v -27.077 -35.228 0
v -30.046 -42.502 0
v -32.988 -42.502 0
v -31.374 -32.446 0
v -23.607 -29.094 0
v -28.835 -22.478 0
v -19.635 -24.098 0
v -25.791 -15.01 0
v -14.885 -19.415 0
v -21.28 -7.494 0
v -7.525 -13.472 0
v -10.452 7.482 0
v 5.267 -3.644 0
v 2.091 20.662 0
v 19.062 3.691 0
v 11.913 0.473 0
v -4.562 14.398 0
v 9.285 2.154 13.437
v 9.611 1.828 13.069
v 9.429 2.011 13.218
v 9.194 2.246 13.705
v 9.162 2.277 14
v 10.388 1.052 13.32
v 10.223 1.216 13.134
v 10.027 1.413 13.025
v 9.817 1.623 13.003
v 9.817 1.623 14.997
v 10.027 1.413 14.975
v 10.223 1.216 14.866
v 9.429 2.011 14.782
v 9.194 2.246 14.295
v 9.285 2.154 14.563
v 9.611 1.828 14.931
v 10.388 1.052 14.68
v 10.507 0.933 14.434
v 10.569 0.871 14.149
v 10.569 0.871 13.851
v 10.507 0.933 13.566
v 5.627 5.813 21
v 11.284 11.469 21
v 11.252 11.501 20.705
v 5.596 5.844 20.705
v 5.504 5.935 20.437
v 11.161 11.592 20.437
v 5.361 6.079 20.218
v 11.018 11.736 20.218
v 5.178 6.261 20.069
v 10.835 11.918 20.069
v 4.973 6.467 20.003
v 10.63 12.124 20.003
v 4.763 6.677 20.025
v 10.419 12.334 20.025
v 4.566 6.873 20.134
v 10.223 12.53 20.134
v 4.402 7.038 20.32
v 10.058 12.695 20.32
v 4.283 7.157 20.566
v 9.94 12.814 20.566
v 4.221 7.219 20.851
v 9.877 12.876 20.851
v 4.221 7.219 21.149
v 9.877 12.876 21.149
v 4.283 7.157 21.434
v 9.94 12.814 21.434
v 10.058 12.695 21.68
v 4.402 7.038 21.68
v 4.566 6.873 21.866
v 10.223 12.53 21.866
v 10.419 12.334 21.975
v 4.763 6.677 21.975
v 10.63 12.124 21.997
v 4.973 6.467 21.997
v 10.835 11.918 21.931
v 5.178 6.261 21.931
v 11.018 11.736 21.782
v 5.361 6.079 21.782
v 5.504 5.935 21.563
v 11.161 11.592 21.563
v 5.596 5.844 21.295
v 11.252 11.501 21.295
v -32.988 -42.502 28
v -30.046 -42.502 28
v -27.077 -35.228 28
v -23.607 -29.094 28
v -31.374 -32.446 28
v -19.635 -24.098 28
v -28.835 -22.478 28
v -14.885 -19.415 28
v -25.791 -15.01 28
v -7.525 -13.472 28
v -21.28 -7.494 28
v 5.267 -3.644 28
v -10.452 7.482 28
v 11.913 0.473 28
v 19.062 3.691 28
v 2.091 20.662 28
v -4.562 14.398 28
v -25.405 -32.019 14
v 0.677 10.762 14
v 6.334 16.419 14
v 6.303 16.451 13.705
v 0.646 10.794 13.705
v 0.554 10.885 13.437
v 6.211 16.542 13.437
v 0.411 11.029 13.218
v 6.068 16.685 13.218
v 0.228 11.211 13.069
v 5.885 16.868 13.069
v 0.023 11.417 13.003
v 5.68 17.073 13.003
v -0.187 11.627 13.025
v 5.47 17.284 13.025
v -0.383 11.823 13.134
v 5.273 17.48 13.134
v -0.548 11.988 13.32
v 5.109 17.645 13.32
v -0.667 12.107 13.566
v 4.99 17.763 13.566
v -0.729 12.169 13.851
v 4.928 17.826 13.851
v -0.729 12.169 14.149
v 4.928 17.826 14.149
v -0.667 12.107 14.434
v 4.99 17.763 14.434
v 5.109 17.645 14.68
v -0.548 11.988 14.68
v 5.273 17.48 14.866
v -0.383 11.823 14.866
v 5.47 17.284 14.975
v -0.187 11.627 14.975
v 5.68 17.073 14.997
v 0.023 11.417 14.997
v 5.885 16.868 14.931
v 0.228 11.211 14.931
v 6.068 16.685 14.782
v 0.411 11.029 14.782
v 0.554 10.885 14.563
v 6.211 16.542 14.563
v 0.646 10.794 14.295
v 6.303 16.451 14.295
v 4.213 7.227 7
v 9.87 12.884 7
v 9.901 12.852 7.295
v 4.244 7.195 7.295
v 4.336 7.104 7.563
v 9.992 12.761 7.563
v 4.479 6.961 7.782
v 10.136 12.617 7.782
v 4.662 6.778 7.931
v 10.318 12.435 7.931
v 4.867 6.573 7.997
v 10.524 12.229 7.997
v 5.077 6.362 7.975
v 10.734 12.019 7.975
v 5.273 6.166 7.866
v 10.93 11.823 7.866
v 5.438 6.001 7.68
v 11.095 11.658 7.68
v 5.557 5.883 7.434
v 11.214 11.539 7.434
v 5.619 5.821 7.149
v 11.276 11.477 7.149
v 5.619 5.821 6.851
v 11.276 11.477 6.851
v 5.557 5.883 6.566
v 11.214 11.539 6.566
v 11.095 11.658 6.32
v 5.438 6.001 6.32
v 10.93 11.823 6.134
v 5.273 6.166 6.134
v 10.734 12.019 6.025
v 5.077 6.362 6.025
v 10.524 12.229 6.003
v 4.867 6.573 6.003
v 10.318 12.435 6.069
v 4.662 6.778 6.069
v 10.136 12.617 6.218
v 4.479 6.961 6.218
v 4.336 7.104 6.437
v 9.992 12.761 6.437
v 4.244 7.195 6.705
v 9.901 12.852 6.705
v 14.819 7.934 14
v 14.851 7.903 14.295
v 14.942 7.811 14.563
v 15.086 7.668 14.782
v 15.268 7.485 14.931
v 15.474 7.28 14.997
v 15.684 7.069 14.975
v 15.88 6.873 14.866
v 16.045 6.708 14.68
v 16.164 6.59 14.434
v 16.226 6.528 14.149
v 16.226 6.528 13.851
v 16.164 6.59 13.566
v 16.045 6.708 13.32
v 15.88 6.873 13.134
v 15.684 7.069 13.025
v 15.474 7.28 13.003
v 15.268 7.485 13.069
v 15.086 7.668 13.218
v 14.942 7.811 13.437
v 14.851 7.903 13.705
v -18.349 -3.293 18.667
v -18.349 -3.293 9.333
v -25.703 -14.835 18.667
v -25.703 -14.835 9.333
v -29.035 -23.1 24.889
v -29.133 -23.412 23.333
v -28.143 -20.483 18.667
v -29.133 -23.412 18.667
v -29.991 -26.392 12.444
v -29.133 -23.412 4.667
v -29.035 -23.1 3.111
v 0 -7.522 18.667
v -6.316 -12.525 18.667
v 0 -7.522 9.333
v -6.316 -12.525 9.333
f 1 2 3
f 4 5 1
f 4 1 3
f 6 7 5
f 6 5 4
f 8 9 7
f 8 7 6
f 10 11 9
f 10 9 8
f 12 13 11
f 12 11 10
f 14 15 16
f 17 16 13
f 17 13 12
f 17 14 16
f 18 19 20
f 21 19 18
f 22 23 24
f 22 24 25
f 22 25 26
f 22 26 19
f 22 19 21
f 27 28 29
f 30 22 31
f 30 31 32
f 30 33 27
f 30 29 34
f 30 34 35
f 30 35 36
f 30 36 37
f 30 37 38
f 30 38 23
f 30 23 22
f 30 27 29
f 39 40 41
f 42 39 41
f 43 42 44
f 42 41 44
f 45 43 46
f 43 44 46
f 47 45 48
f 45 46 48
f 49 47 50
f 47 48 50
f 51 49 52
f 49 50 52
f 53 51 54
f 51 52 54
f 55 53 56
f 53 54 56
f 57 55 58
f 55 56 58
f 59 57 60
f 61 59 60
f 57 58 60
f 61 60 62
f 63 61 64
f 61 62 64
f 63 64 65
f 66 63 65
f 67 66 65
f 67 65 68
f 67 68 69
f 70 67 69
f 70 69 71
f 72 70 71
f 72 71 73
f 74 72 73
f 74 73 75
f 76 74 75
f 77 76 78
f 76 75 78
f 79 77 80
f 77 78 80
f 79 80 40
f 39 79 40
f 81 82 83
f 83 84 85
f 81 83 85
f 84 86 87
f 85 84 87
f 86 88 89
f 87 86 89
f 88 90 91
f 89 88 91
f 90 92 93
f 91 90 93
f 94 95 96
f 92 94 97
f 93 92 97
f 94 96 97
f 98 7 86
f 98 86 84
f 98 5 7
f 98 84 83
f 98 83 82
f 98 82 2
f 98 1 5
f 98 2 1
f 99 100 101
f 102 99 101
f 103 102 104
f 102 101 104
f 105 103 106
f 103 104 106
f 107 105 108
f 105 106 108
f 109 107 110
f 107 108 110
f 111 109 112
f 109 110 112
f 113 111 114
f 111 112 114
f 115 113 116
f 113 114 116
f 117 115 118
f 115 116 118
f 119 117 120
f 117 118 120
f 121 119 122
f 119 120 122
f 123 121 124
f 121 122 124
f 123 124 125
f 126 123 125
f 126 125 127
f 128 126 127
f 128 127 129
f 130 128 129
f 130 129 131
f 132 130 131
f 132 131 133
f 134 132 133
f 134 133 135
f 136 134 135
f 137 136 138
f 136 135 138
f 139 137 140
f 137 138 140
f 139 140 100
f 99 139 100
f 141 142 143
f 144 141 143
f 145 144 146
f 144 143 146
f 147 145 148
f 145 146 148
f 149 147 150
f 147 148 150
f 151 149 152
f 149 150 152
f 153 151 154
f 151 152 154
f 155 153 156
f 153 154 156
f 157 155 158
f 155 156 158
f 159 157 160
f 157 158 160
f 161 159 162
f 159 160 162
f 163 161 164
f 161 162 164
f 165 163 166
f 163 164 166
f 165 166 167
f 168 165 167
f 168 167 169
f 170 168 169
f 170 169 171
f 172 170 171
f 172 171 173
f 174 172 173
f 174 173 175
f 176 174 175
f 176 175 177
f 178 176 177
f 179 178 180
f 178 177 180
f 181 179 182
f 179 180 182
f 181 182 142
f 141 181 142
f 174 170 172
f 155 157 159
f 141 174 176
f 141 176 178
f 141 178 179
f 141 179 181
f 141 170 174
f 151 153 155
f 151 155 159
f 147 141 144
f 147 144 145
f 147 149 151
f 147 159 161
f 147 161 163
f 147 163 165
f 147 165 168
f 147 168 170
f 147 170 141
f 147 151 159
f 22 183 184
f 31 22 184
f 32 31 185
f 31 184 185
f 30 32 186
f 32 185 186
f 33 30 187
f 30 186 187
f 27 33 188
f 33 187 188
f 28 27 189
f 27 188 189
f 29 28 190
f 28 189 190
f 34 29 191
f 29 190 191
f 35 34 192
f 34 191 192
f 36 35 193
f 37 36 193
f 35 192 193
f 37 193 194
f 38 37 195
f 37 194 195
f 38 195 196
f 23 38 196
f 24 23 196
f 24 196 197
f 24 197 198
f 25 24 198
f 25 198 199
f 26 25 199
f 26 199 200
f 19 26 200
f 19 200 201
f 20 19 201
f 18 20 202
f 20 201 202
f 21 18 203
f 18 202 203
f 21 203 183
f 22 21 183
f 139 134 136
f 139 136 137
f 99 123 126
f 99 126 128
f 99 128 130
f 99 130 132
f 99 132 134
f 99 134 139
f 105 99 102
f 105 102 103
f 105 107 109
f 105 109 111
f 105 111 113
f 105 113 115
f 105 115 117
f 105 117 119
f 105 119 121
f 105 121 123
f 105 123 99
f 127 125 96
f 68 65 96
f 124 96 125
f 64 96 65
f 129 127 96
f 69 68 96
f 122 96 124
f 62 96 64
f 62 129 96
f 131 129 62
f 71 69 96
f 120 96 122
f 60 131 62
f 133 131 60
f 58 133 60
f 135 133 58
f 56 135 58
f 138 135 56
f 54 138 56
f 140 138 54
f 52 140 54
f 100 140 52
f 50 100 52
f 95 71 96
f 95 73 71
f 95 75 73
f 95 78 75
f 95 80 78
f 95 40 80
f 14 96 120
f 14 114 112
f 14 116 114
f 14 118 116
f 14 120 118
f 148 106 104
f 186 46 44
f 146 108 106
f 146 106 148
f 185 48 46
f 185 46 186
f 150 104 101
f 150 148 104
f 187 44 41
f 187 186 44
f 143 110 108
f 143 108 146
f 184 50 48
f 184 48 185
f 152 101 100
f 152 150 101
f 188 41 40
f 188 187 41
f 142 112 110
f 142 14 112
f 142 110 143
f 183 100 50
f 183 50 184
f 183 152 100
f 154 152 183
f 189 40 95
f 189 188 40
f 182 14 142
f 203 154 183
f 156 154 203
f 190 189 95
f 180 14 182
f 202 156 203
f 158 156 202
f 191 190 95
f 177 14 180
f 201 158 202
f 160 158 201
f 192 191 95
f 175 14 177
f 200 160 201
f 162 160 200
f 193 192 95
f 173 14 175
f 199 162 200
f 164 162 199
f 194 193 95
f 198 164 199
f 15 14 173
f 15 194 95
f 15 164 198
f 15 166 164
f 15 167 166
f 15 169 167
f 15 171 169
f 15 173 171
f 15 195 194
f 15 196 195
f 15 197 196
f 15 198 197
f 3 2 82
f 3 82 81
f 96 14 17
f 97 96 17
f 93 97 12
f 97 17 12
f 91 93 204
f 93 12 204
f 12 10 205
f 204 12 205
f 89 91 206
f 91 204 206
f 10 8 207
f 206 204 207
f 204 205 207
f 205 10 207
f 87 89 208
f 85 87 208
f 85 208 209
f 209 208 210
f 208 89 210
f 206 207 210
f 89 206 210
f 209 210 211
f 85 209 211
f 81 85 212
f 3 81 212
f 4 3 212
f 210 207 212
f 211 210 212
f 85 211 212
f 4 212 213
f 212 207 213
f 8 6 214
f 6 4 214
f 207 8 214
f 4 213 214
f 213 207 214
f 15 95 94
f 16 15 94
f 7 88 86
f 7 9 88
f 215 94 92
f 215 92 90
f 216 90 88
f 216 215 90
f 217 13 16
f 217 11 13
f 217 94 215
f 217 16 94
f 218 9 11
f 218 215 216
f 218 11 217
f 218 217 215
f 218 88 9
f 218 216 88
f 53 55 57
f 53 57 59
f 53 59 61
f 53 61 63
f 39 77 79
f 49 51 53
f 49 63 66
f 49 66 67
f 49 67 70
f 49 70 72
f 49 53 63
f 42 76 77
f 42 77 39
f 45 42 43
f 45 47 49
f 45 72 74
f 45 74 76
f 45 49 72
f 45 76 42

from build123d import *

# Parameters (mm, degrees)
BOSS_EXTRUDE1_DEPTH = 28
SKETCH2_R           = 1
CUT_EXTRUDE1_DEPTH  = 8


with BuildPart() as part:
    # Sketch1 → Boss-Extrude1 (new body)
    with BuildSketch(Plane.XY):
        with BuildLine():
            Line((2.091427576, 20.661862086), (19.061990324, 3.691299338))
            add(Edge.make_bspline(
                [(19.061990324, 3.691299338), (12.022648732, 1.181374363), (3.606718166, -4.502881384), (-8.768521596, -14.578433411), (-15.710250584, -19.650895957), (-19.63487909, -24.098483284)],
                knots=[0, 0, 0, 0, 0.463104191, 0.631300778, 1, 1, 1, 1], degree=3))
            add(Edge.make_bspline(
                [(-19.63487909, -24.098483284), (-25.969562098, -30.737294566), (-30.045502317, -42.502143037)],
                knots=[0, 0, 0, 1, 1, 1], degree=2))
            Line((-30.045502317, -42.502143037), (-32.987873718, -42.502143037))
            add(Edge.make_bspline(
                [(2.091427576, 20.661862086), (-6.153665282, 13.902778077), (-14.884492863, 1.613682443), (-29.203935151, -18.642558282), (-31.728248971, -33.20873178), (-32.987873718, -42.502143037)],
                knots=[0, 0, 0, 0, 0.426775149, 0.611805153, 1, 1, 1, 1], degree=3))
        make_face()
    extrude(amount=BOSS_EXTRUDE1_DEPTH)

    # Sketch2 → Cut-Extrude1 (cut)
    with BuildSketch(Plane(origin=(11.376644831, 11.376644831, 0), x_dir=(0, 0, -1), z_dir=(0.7071067811865388, 0.7071067811865562, 0))):
        with Locations(Location((-7, 1.131280172, 0), (0, 0, 90))):
            Circle(SKETCH2_R)
        with Locations(Location((-14, 8.131280172, 0), (0, 0, 270))):
            Circle(SKETCH2_R)
        with Locations(Location((-14, -5.868719828, 0), (0, 0, 90))):
            Circle(SKETCH2_R)
        with Locations(Location((-21, 1.131280172, 0), (0, 0, 270))):
            Circle(SKETCH2_R)
    extrude(amount=-CUT_EXTRUDE1_DEPTH, mode=Mode.SUBTRACT)


solid = part.part
